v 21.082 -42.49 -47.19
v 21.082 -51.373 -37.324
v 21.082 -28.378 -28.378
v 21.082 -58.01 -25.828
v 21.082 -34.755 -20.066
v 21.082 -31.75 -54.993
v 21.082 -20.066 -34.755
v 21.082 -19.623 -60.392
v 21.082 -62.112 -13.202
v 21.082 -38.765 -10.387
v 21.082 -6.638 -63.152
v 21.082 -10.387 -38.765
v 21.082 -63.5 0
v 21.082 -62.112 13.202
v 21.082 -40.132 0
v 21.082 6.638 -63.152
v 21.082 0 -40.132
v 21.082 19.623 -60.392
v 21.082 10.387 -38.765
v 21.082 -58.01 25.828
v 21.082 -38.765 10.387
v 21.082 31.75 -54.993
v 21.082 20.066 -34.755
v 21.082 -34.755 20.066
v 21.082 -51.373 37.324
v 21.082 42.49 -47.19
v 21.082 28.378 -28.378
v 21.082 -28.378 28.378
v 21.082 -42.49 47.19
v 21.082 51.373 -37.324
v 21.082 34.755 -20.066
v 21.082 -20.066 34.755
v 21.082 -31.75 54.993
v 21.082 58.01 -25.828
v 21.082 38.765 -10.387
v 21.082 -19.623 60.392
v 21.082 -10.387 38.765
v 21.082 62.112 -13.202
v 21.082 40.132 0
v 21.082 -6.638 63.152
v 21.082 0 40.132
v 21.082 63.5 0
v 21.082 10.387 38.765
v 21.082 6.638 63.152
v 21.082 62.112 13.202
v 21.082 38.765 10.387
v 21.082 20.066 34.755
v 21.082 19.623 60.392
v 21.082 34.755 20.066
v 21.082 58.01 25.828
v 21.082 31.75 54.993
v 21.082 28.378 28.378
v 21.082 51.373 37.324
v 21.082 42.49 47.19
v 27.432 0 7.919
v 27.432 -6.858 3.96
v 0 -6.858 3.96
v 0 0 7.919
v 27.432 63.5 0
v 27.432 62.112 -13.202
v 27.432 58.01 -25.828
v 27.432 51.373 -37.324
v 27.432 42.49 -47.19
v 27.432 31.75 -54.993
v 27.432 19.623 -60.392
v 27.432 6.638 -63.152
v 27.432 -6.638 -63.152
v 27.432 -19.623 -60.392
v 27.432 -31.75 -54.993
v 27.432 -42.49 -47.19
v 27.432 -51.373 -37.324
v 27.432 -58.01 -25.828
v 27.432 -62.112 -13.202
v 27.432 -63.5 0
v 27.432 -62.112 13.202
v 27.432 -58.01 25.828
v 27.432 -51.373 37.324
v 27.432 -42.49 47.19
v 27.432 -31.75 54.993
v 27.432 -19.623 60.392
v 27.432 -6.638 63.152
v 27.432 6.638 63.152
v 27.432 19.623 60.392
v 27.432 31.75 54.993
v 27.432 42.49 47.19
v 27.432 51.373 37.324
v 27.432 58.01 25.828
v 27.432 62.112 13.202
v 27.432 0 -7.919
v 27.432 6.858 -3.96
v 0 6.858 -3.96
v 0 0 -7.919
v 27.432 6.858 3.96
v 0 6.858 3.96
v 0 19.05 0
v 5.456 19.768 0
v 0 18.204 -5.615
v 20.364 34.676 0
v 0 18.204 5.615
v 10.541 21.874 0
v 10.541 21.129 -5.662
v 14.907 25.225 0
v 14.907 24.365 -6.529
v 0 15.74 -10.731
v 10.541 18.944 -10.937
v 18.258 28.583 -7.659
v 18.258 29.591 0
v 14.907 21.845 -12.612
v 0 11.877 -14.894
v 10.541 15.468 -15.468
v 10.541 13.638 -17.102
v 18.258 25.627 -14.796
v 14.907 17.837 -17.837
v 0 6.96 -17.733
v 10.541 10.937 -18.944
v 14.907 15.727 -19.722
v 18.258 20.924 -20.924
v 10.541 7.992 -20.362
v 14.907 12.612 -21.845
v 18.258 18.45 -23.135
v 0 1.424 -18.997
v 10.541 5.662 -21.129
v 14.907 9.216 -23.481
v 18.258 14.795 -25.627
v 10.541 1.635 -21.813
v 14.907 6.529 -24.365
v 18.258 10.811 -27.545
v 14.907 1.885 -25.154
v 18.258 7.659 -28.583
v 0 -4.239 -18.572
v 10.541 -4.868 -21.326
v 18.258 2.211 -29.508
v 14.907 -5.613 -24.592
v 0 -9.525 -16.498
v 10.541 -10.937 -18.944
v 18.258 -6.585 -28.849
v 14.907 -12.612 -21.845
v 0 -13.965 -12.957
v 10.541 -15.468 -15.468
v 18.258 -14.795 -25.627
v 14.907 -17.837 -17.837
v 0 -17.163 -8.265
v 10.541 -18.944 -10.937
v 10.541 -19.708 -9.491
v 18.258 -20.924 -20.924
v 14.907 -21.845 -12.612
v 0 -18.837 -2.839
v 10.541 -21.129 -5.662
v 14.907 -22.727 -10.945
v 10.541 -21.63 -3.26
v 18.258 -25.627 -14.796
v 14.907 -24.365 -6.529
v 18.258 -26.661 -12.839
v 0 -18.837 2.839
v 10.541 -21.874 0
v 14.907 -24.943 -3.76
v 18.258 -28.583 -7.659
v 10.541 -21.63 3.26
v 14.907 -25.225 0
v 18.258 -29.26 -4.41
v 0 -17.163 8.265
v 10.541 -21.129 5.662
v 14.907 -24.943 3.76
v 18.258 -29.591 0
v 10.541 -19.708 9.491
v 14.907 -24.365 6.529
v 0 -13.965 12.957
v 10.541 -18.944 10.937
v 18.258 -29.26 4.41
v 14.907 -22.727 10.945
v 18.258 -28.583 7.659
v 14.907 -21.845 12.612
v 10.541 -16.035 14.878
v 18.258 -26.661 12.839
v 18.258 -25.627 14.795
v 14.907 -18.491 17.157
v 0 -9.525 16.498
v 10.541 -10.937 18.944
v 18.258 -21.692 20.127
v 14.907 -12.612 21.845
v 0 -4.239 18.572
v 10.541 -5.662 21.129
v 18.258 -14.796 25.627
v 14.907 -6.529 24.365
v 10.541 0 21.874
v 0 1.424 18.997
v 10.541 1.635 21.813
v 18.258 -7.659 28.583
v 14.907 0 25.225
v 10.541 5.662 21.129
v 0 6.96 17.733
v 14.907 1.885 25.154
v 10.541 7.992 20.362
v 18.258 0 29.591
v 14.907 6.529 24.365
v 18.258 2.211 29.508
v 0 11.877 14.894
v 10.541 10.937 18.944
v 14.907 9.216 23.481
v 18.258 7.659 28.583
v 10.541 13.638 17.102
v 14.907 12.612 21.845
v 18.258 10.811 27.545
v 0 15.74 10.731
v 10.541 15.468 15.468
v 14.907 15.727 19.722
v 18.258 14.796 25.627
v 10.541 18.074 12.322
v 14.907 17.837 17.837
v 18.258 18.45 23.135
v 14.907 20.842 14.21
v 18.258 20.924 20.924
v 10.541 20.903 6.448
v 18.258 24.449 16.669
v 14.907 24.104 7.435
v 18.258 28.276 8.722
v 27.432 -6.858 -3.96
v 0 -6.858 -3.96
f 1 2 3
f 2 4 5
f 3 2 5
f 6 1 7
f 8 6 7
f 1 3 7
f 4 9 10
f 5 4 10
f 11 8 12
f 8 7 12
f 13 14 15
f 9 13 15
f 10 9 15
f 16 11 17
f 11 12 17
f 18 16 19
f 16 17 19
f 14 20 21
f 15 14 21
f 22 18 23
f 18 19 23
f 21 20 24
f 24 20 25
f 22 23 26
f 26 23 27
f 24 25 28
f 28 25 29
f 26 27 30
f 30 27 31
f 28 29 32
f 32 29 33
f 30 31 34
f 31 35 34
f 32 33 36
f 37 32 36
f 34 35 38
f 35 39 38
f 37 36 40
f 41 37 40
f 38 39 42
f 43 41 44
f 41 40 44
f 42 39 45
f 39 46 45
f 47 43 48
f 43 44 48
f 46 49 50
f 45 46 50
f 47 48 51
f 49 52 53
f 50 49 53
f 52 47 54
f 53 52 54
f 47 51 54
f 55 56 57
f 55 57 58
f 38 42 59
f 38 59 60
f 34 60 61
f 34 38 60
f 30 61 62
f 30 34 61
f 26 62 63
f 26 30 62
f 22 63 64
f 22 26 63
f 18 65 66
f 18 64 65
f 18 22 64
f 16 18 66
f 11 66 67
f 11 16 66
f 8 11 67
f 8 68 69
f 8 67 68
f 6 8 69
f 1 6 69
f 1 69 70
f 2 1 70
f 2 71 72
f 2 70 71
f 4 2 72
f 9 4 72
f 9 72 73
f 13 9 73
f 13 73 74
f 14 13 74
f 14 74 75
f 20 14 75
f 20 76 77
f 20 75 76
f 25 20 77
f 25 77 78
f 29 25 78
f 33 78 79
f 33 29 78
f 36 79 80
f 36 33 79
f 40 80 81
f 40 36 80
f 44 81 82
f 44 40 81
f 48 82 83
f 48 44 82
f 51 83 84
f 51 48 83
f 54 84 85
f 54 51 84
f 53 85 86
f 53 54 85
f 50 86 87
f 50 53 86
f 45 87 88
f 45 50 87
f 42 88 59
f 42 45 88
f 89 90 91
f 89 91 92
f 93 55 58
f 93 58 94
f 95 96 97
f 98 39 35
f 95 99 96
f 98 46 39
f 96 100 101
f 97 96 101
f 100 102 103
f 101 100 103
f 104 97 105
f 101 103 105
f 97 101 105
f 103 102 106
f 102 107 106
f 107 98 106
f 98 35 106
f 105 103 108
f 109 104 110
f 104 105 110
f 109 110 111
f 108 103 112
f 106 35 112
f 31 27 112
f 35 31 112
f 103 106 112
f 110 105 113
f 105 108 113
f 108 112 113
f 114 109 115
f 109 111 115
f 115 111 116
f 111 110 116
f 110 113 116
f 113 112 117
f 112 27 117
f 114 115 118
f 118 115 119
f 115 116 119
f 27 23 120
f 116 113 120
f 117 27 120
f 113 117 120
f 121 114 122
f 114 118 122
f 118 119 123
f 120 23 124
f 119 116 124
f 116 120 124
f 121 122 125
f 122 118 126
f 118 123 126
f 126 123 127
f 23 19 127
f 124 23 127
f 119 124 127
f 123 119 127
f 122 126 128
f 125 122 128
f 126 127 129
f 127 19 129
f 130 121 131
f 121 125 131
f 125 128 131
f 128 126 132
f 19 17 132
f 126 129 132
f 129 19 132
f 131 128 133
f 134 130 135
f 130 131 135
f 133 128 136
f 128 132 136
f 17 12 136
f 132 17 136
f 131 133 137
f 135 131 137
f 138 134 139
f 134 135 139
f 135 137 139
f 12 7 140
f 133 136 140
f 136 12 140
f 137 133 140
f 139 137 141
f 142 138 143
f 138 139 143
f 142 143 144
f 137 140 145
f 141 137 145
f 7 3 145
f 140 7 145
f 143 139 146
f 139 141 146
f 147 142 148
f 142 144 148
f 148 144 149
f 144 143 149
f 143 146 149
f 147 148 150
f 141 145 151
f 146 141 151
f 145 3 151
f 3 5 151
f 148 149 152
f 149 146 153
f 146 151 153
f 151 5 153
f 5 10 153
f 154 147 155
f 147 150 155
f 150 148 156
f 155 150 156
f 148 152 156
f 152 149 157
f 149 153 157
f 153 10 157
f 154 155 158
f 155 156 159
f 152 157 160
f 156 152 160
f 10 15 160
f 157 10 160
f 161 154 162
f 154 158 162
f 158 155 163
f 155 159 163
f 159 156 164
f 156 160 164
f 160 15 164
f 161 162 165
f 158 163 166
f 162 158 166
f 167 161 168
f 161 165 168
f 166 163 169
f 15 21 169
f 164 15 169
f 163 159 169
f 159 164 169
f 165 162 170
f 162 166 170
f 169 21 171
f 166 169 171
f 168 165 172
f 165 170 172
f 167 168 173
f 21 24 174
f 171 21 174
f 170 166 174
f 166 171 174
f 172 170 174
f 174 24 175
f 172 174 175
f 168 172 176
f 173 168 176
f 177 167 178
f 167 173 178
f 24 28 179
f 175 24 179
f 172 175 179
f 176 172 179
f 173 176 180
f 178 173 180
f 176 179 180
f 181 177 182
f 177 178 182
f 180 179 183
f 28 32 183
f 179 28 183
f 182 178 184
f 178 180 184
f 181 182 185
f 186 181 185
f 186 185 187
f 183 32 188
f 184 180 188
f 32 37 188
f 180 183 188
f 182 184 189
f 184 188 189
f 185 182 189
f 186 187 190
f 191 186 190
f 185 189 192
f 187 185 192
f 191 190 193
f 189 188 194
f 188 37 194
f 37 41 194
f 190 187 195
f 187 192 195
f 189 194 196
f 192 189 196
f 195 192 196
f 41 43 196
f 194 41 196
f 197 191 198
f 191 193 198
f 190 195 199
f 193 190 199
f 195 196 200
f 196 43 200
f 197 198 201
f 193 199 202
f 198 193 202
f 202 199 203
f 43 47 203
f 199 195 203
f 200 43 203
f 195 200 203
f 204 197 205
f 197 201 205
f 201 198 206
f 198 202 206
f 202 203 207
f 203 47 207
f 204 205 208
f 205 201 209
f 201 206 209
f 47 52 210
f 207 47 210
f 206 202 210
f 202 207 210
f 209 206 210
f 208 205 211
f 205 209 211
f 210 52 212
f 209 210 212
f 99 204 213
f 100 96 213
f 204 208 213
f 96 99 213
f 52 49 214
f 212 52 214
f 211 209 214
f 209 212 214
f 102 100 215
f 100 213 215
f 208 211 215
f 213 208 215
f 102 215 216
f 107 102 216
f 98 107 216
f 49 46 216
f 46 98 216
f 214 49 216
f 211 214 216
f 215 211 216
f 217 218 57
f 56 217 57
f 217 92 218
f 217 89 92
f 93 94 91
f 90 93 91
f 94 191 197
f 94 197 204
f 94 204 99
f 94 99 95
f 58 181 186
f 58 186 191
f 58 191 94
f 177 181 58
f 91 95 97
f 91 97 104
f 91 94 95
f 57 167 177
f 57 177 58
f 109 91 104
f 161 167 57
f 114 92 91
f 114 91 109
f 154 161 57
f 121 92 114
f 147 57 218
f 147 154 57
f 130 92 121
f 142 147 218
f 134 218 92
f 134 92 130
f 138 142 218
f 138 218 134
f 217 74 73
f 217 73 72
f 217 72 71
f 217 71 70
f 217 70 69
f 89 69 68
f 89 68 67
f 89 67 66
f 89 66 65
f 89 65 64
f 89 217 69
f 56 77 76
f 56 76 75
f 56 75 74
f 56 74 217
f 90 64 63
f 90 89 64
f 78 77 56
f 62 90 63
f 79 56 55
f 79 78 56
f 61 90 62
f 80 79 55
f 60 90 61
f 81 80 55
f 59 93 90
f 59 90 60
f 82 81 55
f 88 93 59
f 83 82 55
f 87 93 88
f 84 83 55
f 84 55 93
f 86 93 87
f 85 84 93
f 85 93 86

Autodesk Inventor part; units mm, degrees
ref_plane "YZ Plane" through (0, 0, 0) normal (1, 0, 0) x (0, 1, 0)
ref_plane "XZ Plane" through (0, 0, 0) normal (0, 1, 0) x (-1, 0, 0)
ref_plane "XY Plane" through (0, 0, 0) normal (0, 0, 1) x (1, 0, 0)
sketch "Sketch1" plane through (0, 0, 0) normal (0, 0, 1) x (1, 0, 0)
  arc A0 (-21.082, 40.132) -> (21.082, 40.132) centre (0, 40.132) ccw
  line L0 (-21.082, 40.132) -> (-21.082, 0)
  line L1 (21.082, 40.132) -> (21.082, 0)
  line L2 (-21.082, 0) -> (21.082, 0)
  line L3 (-21.082, 0) -> (-27.432, 0)
  line L4 (-27.432, 0) -> (-27.432, 63.5)
  line L5 (-27.432, 63.5) -> (-21.082, 63.5)
  line L6 (-21.082, 63.5) -> (-21.082, 0)
  line L7 (21.082, 0) -> (27.432, 0)
  line L8 (27.432, 0) -> (27.432, 63.5)
  line L9 (27.432, 63.5) -> (21.082, 63.5)
  line L10 (21.082, 63.5) -> (21.082, 0)
  point P0 (0, 0)
  dimension "diameterOfPipe" = 42.164
  dimension "d6" = 6.35
  dimension "d7" = 63.5
  dimension "d8" = 6.35
  dimension "d9" = 63.5
  dimension "d13" = 19.05
revolve "Revolution1" add sketch "Sketch1" angle 360 about axis through (-21.082, 0, 0) along (1, 0, 0)
sketch "Sketch3" plane through (27.432, 0, 0) normal (1, 0, 0) x (0, 0, -1)
  line L0 (7.9189, 0) -> (3.9595, -6.858)
  line L1 (3.9595, -6.858) -> (-3.9595, -6.858)
  line L2 (-3.9595, -6.858) -> (-7.9189, 0)
  line L3 (-7.9189, 0) -> (-3.9595, 6.858)
  line L4 (-3.9595, 6.858) -> (3.9595, 6.858)
  line L5 (3.9595, 6.858) -> (7.9189, 0)
  point P0 (0, 0)
  point P1 (0, 0)
  dimension "hexWidth" = 13.716
extrude "Extrusion2" cut sketch "Sketch3" against normal through all
split "Split1" plane through (0, 0, 0) removes the side toward (-1, 0, 0)
equation "\"d6\" = widthOfOutside"
equation "\"d8\" = widthOfOutside"
equation "\"widthOfOutside\" = 6.35"
properties part number "halfWheelForHangingAndMoving" material "PBT Plastic"
